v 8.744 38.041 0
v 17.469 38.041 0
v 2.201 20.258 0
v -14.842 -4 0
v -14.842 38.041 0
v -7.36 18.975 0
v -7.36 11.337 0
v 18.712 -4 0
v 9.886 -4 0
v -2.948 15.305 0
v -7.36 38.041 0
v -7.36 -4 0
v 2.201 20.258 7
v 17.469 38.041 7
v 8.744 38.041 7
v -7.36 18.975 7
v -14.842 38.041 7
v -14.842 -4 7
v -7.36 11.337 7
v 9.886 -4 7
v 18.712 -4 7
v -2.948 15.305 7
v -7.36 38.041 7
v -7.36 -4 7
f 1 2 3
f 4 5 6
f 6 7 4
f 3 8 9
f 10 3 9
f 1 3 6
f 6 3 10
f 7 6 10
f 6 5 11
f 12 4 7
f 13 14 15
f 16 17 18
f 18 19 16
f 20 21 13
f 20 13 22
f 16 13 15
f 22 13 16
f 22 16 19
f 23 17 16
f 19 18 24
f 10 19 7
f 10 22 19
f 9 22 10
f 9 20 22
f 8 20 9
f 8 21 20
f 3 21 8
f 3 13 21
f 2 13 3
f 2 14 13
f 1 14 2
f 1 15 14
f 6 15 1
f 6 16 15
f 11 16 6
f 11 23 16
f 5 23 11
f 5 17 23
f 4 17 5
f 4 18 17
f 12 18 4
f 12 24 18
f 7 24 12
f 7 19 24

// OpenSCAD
// file: glyph.scad
// glyph — the shared geometry of every letter in the set. Defines named geometry
// only, so it renders nothing on its own; each letter part includes it and calls
// letter(). Every dimension lives in ../../lib/common.scad.
//
// A LETTER IS NOTHING BUT A LETTER. No plinth, no tongue, no tab — it is the
// bare glyph, and it attaches by standing in the deck groove and resting on the
// groove's floor. Anything else on it would be a distraction on a learning toy.
//
// It is a flat plate of one thickness, printed face-down: no overhang anywhere,
// no supports, and the face on the bed comes out smoothest.
//
// TWO TRAPS WITH text():
//
//  * A missing font FALLS BACK SILENTLY — no warning, no error, just different
//    letters. "Liberation Sans" was the first choice here because OpenSCAD
//    bundles it; on macOS the bundled faces are not registered with fontconfig,
//    so it rendered the fallback face instead and nothing said so. To check a
//    font resolved, render a string with it and with a deliberately bogus name
//    and compare bounding boxes: identical means it fell back.
//  * `size` is not the cap height in general. For Helvetica Bold they coincide
//    (size 44 -> 44.0 mm cap), which is why letter_size reads as a height.
//    Change the font and re-measure.

include <../../lib/common.scad>

// The letter's outline, upright in the XY plane, ready to be extruded along Z
// (which is the letter's thickness, and the print's build axis).
//
//   y = 0   is the deck surface
//   y < 0   is the part standing down inside the groove. It reaches letter_bury,
//           which is where the tapered groove closes to letter_t — NOT the
//           groove's floor. The letter wedges; it never bottoms out.
module glyph_2d(ch) {
    intersection() {
        translate([0, -letter_bury])
            scale([letter_condense, 1])
                text(ch, size = letter_size, font = letter_font,
                     halign = "center", valign = "baseline");
        // Trimmed flat at the baseline. Round letters (O, C, G, S) overshoot the
        // baseline by design, and a letter standing on a convex curve rocks —
        // there is nothing to stop it leaning. The trim costs nothing visible
        // and gives every letter a flat foot on the groove floor.
        translate([-200, -letter_bury]) square([400, 400]);
    }
}

// One letter, in its print orientation: lying on its face, thickness up Z.
module letter(ch) {
    linear_extrude(letter_t) glyph_2d(ch);
}

// Where that letter sits once it is dropped into a chassis, for fit checks.
module letter_fitted(ch) {
    translate([0, letter_t/2, body_top]) rotate([90, 0, 0]) letter(ch);
}
// main file
// letter K — one part. See glyph.scad for the geometry and lib/common.scad for
// the dimensions. Prints lying on its face, exactly as exported: no supports.

include <glyph.scad>

letter("K");
